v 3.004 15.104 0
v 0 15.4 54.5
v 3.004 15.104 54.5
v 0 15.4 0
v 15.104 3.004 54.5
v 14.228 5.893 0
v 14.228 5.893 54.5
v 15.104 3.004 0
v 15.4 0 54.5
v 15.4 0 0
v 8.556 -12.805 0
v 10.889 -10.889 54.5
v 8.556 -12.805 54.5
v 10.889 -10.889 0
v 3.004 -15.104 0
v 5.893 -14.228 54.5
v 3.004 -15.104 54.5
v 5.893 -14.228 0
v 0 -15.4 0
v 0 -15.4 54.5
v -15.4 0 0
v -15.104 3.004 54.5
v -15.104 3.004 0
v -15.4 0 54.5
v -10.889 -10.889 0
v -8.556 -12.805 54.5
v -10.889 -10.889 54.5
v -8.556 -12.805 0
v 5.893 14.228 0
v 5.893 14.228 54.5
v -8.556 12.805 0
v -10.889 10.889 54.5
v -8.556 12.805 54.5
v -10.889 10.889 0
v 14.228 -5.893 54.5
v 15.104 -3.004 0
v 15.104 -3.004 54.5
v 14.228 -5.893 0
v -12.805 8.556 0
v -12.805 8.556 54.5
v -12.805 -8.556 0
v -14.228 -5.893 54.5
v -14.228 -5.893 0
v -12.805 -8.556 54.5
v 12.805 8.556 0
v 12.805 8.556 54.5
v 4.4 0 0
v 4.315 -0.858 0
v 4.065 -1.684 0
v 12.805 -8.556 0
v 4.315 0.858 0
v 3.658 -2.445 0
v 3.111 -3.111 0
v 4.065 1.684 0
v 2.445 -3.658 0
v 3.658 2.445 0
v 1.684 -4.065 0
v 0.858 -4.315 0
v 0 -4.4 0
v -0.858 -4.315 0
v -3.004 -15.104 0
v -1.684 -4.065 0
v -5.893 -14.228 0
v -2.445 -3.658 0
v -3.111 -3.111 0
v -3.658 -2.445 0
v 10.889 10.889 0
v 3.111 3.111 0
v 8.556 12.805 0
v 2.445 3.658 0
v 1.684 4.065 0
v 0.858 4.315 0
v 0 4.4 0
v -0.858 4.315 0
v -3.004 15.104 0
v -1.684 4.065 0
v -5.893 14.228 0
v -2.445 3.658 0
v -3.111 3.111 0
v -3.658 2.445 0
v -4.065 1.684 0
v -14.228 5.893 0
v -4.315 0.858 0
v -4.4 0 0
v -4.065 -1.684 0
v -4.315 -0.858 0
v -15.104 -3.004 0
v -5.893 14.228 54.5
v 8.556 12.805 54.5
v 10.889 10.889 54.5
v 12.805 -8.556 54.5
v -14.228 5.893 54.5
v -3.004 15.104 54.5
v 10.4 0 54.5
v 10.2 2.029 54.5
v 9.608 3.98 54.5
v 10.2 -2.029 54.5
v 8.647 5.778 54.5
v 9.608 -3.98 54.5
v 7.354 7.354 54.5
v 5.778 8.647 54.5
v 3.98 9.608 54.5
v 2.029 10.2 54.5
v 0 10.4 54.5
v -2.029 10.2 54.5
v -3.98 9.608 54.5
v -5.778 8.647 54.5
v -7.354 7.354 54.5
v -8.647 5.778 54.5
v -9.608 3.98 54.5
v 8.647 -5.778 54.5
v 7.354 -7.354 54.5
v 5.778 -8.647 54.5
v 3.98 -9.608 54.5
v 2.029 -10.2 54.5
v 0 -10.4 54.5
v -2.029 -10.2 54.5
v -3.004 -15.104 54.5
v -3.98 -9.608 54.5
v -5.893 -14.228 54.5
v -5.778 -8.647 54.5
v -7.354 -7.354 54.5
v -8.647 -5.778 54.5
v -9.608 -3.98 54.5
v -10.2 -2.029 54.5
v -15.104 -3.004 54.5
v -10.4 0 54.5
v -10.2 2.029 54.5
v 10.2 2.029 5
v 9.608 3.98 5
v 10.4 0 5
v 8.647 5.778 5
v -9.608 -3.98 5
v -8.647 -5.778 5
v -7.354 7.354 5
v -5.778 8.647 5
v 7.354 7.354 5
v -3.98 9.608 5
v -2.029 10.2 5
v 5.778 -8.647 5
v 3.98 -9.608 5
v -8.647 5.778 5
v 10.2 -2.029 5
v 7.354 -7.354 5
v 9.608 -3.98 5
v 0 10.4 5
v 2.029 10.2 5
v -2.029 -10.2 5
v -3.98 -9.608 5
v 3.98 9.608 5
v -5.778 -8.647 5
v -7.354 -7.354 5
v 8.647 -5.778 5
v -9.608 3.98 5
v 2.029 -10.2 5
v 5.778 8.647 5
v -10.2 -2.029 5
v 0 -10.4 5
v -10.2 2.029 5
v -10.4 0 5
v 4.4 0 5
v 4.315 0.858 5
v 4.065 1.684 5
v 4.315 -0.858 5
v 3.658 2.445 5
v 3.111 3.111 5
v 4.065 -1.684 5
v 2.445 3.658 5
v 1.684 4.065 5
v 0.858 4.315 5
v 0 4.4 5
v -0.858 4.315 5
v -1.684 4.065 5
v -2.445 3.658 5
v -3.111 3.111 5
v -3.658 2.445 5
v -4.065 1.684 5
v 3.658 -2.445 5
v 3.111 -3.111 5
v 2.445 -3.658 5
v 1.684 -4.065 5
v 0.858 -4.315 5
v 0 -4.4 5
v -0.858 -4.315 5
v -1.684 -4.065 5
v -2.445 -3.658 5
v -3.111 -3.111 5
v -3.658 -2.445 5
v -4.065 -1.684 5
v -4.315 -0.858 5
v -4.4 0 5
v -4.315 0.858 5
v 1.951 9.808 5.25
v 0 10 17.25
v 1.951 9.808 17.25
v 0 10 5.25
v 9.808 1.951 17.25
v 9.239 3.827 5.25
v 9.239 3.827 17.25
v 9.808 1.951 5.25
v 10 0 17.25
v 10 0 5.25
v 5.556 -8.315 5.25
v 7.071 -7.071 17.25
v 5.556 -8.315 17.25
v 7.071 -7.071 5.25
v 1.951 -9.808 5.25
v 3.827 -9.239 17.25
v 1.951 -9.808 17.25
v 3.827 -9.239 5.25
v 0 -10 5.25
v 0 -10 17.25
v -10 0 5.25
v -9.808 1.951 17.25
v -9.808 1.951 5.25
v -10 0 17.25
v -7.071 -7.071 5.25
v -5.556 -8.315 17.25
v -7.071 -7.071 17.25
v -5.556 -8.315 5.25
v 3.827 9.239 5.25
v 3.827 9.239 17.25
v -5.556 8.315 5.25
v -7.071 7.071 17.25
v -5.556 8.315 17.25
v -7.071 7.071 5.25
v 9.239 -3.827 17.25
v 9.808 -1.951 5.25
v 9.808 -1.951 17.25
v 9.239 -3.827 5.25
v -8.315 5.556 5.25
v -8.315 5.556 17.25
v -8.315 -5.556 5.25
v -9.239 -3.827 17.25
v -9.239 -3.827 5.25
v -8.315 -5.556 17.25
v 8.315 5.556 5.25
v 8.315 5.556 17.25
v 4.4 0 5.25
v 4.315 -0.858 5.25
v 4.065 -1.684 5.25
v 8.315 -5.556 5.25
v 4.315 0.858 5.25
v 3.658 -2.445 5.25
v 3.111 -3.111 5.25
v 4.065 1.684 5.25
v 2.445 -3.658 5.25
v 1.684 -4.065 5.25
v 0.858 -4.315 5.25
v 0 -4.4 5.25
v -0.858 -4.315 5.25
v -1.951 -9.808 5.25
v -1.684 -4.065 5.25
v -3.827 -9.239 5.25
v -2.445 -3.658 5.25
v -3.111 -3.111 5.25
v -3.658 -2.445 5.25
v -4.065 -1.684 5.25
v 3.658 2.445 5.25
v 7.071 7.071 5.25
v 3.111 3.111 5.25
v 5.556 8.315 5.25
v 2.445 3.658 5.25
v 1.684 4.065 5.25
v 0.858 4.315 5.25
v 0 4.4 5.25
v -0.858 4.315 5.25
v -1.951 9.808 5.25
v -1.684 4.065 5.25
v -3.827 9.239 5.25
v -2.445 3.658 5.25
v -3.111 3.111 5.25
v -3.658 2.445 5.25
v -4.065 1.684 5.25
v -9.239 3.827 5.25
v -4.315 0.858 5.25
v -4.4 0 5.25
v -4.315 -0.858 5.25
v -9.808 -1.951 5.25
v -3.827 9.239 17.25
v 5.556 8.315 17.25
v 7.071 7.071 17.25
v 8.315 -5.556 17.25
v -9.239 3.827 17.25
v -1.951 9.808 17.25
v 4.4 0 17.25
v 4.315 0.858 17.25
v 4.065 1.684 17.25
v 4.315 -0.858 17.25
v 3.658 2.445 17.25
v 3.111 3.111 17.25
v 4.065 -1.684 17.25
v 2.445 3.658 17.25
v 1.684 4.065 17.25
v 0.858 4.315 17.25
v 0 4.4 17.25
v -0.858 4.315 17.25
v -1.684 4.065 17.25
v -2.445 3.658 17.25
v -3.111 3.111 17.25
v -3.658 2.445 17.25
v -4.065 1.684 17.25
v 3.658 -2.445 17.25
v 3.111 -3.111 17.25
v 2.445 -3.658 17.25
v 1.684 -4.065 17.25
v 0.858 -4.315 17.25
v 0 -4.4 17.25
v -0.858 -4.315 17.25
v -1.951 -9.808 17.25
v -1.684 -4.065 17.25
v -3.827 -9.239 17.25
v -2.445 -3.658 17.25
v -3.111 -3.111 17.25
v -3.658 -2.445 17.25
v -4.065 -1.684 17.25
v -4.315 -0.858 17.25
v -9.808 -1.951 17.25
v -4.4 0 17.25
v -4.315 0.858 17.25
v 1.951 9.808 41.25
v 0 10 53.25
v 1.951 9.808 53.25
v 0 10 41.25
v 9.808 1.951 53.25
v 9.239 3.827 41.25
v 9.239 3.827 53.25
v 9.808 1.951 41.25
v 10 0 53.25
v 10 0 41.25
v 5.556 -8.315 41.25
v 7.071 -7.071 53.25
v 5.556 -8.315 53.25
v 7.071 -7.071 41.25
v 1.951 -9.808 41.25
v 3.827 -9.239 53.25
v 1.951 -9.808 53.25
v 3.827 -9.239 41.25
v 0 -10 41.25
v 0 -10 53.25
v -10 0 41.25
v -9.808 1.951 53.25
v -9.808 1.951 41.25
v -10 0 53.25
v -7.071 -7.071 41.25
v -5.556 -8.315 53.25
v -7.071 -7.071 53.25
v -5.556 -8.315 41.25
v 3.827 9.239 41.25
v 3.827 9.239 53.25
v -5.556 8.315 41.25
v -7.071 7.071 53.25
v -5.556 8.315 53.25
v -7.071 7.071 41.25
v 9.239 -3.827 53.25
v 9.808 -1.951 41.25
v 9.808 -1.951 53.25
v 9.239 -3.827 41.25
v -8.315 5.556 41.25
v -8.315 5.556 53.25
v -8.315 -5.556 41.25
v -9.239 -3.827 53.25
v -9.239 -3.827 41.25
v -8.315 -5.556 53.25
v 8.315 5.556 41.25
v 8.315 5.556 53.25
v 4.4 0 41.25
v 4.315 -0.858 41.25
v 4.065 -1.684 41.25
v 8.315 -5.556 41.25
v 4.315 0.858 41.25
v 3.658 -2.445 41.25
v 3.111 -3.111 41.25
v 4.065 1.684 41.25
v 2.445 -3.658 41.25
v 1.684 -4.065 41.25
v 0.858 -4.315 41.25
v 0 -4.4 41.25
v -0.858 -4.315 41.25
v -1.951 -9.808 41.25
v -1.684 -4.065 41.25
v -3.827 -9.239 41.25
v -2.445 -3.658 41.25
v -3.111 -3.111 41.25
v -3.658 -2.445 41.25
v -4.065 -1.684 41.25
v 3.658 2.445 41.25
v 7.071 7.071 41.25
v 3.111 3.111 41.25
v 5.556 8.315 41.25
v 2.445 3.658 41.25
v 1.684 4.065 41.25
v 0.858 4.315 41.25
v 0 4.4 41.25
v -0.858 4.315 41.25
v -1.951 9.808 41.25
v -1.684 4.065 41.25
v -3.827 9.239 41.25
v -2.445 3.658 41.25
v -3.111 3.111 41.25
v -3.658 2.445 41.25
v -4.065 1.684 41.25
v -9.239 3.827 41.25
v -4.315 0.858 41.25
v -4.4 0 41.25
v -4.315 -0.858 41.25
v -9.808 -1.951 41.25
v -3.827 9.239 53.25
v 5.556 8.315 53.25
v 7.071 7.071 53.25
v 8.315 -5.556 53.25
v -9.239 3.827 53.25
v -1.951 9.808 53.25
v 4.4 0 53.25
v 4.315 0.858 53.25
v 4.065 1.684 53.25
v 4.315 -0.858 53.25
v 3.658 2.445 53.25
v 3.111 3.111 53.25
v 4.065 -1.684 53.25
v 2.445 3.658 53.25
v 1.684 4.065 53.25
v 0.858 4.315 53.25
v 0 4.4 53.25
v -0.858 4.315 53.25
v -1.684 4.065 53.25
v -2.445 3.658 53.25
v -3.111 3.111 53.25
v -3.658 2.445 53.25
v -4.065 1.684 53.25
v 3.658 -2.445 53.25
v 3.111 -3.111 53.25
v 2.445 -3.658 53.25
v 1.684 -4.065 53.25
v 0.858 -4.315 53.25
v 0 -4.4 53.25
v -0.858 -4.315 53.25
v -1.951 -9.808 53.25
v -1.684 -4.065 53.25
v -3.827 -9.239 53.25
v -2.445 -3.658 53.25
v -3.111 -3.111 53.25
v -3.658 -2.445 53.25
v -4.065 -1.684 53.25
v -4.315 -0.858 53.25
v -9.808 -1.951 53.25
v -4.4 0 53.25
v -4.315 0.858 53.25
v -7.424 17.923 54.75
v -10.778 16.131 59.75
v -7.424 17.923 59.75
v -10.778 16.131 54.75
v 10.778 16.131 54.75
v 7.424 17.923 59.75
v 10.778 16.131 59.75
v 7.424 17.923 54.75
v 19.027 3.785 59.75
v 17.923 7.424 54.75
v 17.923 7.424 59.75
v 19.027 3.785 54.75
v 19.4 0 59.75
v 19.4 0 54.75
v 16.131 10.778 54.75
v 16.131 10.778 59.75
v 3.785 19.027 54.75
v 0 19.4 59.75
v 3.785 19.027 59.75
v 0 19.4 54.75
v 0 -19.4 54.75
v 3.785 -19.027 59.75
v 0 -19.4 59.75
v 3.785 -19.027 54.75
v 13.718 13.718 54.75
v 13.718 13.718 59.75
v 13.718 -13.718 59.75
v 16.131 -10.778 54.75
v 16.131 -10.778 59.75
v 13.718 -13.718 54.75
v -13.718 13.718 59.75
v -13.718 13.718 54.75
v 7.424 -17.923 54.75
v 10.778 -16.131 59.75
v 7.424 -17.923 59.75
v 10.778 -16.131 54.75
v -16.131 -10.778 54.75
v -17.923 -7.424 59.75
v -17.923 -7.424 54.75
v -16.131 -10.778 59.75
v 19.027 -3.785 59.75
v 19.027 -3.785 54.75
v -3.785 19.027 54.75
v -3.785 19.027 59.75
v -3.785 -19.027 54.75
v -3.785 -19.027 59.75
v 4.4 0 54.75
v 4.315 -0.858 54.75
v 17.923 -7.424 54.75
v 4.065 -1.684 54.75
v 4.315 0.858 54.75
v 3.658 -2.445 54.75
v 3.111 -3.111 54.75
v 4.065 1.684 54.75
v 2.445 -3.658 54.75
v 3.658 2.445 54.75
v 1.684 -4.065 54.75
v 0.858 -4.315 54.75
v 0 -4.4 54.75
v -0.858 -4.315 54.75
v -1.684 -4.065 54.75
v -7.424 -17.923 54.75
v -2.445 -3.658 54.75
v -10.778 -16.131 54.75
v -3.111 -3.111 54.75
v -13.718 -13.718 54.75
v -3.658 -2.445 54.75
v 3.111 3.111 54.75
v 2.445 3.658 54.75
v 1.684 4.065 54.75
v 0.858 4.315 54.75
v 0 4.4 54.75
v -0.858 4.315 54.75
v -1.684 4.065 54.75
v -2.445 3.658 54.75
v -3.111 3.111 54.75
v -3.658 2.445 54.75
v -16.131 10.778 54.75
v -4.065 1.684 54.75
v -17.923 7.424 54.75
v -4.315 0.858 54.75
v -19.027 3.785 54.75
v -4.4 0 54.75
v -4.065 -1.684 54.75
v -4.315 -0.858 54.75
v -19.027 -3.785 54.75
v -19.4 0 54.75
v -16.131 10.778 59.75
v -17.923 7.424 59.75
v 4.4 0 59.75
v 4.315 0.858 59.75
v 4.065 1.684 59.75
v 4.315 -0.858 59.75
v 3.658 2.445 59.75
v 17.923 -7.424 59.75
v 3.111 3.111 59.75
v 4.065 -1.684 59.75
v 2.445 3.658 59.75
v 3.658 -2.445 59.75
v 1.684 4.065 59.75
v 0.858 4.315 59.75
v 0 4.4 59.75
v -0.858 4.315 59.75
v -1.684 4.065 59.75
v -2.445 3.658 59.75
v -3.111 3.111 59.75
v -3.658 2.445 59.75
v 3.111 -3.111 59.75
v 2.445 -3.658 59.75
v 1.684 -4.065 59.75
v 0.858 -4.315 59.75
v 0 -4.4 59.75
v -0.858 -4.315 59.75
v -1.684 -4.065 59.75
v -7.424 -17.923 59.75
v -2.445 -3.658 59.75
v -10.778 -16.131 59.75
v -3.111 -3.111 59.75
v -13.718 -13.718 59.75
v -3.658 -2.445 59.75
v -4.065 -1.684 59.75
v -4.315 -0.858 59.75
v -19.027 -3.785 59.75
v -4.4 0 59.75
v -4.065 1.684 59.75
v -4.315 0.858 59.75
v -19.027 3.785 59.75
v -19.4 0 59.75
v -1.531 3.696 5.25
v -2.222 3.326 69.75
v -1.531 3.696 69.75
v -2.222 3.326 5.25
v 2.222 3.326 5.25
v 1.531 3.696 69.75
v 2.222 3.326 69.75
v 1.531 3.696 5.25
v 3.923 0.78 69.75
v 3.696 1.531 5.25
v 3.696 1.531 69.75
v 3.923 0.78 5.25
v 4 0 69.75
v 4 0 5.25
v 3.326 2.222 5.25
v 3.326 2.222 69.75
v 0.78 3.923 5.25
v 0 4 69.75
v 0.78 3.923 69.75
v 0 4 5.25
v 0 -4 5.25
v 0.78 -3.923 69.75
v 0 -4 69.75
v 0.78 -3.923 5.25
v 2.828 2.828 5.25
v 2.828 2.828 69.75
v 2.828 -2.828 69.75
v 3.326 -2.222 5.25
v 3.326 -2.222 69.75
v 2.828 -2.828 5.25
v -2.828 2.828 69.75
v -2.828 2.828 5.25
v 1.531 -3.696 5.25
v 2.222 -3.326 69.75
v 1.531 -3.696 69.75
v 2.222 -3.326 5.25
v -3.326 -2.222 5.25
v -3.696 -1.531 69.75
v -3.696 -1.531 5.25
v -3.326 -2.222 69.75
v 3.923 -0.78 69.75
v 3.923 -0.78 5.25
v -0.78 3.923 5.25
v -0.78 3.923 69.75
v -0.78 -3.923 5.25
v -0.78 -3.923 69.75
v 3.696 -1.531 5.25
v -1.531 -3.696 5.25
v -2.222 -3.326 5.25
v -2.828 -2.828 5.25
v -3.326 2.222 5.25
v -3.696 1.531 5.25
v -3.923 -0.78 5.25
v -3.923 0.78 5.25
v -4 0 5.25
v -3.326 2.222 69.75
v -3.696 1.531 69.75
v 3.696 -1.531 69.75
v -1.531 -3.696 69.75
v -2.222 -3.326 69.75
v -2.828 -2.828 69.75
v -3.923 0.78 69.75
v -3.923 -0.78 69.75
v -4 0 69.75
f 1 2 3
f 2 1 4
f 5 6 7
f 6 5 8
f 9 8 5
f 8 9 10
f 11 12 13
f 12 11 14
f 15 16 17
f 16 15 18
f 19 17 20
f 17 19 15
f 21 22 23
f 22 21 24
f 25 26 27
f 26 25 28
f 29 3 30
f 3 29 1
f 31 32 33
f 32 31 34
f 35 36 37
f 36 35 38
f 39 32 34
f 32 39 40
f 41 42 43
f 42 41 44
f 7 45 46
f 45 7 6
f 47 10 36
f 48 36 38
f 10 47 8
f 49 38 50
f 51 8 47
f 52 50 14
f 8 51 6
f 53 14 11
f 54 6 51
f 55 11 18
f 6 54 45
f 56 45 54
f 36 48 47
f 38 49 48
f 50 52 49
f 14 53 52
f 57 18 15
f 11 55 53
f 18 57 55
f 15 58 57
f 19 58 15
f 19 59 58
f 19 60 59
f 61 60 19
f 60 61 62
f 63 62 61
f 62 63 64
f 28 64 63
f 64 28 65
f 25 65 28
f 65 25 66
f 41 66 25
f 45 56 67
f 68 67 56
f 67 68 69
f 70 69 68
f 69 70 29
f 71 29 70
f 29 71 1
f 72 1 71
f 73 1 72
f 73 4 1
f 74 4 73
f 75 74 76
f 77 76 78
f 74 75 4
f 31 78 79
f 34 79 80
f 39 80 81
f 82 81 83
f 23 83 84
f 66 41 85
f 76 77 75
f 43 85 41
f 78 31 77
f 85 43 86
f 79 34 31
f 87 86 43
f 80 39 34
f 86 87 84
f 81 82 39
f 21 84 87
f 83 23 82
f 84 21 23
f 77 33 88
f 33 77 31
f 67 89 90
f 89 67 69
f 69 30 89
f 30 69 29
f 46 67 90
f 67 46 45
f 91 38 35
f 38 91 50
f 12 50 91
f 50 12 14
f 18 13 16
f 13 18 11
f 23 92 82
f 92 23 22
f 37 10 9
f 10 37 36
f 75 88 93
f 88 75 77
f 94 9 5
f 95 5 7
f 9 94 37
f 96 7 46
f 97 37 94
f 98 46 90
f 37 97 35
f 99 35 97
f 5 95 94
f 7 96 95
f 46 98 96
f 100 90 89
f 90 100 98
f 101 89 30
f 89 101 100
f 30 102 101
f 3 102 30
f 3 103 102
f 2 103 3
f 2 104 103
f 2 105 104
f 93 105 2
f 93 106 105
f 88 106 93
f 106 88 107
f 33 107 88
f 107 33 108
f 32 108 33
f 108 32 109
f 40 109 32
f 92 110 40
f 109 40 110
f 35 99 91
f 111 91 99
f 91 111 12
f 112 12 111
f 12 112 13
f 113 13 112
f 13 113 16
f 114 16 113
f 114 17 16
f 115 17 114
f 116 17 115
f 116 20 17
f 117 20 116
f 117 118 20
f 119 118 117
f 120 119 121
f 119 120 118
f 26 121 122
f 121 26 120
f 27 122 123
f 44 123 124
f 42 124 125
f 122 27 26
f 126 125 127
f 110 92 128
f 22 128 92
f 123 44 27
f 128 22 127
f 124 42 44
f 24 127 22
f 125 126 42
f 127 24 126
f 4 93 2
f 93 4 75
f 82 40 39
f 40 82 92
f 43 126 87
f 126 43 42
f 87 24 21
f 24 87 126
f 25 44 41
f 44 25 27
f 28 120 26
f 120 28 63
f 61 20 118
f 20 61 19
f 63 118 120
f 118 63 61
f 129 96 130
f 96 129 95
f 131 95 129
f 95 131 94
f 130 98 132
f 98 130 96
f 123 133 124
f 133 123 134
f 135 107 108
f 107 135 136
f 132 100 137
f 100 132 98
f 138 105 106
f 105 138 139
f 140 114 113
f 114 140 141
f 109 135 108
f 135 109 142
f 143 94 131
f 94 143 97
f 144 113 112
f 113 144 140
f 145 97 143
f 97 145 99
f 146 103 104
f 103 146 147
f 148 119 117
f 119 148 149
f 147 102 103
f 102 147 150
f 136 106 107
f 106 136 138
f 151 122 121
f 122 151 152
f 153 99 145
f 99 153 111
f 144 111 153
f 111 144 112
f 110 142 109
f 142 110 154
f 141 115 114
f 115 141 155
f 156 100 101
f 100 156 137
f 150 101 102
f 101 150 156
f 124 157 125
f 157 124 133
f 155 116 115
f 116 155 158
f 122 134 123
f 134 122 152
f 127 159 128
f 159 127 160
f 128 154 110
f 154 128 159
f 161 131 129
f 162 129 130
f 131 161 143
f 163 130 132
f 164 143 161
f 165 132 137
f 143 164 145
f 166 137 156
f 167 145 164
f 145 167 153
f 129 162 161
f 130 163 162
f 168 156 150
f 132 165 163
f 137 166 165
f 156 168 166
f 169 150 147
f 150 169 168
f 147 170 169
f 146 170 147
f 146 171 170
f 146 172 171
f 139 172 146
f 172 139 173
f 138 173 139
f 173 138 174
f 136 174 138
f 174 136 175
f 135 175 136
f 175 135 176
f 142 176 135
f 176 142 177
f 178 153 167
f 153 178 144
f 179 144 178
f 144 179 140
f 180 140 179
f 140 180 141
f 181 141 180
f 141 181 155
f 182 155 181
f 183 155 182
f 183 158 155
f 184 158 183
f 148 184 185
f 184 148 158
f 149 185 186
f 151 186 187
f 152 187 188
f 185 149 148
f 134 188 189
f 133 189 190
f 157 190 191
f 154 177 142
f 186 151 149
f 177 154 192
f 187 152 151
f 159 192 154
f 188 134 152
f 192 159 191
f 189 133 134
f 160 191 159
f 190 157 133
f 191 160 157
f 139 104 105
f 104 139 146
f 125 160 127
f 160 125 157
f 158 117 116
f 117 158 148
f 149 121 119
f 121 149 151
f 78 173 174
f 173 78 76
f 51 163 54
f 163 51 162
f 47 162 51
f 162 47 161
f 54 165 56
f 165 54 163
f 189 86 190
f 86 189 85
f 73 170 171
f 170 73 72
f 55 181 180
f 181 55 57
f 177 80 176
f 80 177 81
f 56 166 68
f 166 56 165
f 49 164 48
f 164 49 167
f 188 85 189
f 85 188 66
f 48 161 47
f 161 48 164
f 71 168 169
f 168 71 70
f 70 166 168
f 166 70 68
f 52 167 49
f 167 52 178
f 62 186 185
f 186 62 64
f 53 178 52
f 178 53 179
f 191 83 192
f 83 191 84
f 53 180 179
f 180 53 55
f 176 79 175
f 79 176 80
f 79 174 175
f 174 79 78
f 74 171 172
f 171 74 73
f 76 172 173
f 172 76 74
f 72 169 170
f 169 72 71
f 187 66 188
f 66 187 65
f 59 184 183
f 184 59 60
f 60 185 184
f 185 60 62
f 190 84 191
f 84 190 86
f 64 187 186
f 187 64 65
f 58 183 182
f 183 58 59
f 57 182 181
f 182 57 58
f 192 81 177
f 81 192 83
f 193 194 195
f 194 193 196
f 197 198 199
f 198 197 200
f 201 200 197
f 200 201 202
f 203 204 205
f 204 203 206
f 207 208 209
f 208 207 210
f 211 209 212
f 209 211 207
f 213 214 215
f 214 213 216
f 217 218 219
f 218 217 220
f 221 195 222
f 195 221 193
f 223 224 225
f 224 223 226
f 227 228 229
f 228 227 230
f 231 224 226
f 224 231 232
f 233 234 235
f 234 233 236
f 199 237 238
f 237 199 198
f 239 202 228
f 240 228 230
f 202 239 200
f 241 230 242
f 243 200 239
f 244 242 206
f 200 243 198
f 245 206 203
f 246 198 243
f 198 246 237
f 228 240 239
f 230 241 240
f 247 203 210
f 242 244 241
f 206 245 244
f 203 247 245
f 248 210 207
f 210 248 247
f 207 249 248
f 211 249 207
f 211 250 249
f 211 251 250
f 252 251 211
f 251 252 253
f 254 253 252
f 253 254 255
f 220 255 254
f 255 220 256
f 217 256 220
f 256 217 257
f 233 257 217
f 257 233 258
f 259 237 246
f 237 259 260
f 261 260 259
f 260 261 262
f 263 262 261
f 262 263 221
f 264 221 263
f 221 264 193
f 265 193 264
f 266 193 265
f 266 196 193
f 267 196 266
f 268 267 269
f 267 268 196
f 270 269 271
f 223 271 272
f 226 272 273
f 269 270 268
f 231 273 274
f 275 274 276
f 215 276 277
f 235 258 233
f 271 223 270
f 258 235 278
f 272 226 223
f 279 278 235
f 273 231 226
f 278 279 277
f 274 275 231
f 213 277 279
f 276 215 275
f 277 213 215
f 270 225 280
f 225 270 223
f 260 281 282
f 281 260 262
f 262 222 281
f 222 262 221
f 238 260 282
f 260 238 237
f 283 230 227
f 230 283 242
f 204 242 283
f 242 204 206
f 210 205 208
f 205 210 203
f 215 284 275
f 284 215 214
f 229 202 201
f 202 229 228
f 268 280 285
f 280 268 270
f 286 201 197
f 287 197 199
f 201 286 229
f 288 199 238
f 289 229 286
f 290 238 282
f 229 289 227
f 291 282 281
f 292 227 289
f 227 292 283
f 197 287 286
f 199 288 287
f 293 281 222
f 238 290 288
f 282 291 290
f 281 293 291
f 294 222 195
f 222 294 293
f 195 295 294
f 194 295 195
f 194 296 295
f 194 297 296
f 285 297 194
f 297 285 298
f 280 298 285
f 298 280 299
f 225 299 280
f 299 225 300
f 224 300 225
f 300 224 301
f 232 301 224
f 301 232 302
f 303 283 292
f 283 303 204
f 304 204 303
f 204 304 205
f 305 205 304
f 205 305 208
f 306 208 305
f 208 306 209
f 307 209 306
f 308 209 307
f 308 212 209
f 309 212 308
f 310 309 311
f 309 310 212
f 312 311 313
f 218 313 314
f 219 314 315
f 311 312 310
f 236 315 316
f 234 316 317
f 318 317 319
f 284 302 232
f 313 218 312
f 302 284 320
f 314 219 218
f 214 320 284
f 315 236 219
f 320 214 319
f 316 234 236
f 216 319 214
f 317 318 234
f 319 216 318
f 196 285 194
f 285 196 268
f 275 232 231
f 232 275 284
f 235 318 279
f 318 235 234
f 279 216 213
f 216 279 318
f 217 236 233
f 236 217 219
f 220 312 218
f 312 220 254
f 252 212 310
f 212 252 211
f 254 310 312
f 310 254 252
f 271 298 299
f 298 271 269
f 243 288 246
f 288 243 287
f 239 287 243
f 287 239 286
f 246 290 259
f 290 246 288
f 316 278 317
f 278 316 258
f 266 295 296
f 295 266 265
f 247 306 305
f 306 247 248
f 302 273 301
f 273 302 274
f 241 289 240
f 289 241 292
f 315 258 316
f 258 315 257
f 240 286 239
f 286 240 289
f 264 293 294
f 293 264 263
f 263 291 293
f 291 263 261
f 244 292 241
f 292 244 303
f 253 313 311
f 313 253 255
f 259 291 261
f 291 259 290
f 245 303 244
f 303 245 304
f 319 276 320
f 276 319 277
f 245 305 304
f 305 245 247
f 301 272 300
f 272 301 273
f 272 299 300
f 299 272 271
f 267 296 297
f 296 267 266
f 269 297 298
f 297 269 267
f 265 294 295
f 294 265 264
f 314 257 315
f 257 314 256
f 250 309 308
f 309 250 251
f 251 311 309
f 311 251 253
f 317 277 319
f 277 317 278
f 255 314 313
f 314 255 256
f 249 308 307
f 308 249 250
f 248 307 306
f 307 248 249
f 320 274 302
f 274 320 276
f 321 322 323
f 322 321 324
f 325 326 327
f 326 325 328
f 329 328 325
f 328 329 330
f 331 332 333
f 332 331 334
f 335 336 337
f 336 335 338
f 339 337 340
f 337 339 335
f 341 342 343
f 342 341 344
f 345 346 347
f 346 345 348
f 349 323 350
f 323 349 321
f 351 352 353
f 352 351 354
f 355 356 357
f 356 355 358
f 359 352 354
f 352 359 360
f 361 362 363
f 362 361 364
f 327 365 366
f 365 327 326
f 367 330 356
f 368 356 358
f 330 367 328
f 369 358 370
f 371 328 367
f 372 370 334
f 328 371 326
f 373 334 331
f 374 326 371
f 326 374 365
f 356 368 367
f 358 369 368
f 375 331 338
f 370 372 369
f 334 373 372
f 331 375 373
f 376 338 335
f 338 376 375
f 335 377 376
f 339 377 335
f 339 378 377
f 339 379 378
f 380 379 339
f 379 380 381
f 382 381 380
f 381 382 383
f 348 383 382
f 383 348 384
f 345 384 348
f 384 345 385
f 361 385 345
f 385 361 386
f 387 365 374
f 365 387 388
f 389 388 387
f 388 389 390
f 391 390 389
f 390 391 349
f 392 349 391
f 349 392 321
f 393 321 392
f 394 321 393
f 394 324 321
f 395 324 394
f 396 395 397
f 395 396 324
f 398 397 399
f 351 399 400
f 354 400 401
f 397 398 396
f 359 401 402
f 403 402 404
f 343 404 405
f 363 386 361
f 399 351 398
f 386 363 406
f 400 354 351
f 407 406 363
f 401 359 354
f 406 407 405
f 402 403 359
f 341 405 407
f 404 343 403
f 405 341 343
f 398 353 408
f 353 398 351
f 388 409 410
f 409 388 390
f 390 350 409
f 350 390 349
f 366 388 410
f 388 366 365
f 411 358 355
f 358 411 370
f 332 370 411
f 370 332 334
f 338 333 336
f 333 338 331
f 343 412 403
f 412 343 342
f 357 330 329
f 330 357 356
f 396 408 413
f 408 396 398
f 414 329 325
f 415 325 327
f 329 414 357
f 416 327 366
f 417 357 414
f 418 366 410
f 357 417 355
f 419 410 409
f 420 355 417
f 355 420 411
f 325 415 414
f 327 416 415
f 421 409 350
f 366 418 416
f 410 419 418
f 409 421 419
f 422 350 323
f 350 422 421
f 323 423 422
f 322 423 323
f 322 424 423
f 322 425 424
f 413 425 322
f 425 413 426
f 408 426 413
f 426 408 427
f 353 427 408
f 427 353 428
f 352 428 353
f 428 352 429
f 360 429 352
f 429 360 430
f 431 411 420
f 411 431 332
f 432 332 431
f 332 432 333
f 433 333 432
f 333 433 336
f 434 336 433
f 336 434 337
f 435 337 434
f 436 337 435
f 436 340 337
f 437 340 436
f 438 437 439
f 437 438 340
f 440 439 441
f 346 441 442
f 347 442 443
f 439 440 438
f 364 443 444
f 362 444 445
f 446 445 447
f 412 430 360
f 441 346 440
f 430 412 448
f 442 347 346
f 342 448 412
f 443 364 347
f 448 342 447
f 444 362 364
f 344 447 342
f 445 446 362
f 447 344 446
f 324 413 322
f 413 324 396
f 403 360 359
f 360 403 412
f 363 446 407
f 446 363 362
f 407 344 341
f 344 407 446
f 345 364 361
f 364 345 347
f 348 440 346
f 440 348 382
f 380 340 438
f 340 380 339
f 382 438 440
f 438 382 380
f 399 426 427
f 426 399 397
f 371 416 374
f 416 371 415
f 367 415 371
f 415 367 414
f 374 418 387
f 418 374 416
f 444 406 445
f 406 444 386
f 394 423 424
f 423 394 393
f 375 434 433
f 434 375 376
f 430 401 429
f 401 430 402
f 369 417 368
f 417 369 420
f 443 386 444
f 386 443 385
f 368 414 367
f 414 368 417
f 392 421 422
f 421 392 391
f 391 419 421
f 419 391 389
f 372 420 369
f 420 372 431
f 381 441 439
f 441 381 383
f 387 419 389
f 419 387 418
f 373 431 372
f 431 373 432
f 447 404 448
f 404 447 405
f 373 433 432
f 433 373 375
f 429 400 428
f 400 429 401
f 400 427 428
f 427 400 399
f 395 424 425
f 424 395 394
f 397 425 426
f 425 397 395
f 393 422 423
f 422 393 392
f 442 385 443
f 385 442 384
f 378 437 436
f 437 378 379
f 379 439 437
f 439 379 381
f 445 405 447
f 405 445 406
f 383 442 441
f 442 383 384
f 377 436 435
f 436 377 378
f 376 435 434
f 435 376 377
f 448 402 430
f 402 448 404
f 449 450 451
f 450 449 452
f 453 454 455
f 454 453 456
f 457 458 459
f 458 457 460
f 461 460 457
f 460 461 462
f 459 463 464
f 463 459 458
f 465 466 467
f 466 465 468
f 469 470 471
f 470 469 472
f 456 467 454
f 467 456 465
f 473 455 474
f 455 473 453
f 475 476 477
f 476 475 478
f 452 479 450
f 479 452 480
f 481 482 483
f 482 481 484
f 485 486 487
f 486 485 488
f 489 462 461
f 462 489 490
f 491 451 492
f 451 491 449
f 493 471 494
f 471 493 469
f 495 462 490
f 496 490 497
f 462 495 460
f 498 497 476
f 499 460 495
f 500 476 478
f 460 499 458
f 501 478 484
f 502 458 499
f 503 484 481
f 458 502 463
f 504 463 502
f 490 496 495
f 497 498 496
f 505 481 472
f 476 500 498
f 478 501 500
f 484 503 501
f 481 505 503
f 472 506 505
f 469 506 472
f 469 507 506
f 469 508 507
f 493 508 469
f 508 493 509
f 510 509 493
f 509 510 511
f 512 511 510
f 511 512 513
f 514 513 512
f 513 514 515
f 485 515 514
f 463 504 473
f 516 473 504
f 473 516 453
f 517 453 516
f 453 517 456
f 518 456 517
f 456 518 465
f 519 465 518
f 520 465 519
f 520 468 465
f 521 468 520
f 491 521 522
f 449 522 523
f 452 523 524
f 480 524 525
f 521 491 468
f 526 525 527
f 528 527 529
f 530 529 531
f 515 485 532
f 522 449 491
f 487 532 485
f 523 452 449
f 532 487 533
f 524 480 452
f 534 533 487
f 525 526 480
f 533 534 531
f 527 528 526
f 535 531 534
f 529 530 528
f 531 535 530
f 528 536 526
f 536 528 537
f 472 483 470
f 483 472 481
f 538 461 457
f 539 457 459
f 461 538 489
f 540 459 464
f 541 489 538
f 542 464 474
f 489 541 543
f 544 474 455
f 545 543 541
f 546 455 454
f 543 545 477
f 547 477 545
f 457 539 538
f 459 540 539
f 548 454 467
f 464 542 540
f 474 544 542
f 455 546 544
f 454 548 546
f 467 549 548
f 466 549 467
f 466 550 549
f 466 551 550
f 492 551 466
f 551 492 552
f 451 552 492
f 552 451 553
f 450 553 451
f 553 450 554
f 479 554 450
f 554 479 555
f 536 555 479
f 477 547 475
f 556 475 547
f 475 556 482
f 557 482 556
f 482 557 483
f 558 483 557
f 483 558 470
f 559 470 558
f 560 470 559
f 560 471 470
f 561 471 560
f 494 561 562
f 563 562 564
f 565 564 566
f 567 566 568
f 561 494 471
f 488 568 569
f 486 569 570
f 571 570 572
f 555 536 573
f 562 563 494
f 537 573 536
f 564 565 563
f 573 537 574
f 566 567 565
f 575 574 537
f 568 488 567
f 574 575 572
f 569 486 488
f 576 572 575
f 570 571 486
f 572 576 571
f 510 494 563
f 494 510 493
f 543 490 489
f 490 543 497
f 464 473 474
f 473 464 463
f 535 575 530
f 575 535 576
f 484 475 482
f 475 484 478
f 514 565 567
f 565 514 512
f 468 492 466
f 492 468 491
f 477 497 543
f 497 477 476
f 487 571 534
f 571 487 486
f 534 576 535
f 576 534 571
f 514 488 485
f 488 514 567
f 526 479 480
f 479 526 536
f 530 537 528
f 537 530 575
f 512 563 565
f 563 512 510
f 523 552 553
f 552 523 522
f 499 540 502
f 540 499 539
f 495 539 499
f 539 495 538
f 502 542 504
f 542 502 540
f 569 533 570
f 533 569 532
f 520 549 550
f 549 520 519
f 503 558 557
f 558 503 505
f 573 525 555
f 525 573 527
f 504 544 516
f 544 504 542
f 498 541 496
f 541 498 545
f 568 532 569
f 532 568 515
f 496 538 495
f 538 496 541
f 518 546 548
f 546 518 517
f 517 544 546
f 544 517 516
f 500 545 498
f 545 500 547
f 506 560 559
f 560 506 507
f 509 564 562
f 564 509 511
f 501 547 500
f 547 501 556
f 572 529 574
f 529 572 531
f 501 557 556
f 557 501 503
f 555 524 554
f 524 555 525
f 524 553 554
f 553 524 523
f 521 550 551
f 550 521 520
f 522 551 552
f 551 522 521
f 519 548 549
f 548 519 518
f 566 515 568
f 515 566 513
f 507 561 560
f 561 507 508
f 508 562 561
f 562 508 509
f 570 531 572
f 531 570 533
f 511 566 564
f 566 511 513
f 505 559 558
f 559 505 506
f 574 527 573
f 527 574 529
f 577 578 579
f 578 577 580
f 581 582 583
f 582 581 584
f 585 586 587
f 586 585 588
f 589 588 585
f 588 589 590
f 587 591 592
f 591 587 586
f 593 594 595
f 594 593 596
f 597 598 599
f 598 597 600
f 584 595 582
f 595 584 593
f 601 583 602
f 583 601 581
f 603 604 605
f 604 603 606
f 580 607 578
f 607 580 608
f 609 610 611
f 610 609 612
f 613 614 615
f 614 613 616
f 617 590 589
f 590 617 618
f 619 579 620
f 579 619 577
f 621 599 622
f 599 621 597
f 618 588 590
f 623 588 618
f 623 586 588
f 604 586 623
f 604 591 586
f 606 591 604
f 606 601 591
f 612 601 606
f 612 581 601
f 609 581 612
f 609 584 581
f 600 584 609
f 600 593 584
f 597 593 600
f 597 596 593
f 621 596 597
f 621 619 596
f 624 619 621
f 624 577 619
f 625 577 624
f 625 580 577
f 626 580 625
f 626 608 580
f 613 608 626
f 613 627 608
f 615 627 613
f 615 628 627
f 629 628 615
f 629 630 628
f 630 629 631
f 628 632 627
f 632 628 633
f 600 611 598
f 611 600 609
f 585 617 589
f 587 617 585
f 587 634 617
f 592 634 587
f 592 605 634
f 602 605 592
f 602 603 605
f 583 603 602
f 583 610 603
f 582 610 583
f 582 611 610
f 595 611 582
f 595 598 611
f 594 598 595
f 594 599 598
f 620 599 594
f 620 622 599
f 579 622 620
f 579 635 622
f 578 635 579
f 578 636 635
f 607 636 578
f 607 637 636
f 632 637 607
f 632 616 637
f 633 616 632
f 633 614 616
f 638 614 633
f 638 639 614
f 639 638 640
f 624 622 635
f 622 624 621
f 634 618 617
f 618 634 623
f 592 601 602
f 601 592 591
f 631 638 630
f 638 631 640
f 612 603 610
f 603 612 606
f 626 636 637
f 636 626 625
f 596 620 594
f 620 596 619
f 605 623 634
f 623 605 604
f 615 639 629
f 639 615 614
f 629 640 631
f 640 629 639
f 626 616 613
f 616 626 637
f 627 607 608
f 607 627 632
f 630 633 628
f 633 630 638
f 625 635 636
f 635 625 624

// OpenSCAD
$fn = 32;

// ------------------------------------------------------------------------
// Shaft station: cup d30.8 x 54.5 mm, shaft d8
// Every part is its own module, assembly() places every instance.
// ------------------------------------------------------------------------

// --- part 1 ---
module housing_cup() {
  difference() {
    cylinder(h = 54.5, d = 30.8);
    translate([0, 0, 5]) cylinder(h = 50.5, d = 20.8);
    translate([0, 0, -1]) cylinder(h = 7, d = 8.8);
  }
}

// --- part 2 ---
module bearing_lower() {
  difference() {
      translate([0, 0, 0]) cylinder(h = 12, d = 20);
      translate([0, 0, -1]) cylinder(h = 14, d = 8.8);
    }
}

// --- part 3 ---
module bearing_upper() {
  difference() {
      translate([0, 0, 0]) cylinder(h = 12, d = 20);
      translate([0, 0, -1]) cylinder(h = 14, d = 8.8);
    }
}

// --- part 4 ---
module station_shaft() {
  translate([0, 0, -32.25]) cylinder(h = 64.5, d = 8);
}

// --- part 5 ---
module station_cover() {
  difference() {
    cylinder(h = 5, d = 38.8);
    translate([0, 0, -1]) cylinder(h = 7, d = 8.8);
  }
}

// --- assembly ---
module assembly() {
  color([0.80, 0.24, 0.20]) translate([0, 0, 0]) rotate([0, 0, 0]) housing_cup();
  color([0.20, 0.45, 0.75]) translate([0, 0, 5.25]) rotate([0, 0, 0]) bearing_lower();
  color([0.25, 0.62, 0.32]) translate([0, 0, 41.25]) rotate([0, 0, 0]) bearing_upper();
  color([0.92, 0.70, 0.18]) translate([0, 0, 37.5]) rotate([0, 0, 0]) station_shaft();
  color([0.58, 0.35, 0.70]) translate([0, 0, 54.75]) rotate([0, 0, 0]) station_cover();
}

assembly();
